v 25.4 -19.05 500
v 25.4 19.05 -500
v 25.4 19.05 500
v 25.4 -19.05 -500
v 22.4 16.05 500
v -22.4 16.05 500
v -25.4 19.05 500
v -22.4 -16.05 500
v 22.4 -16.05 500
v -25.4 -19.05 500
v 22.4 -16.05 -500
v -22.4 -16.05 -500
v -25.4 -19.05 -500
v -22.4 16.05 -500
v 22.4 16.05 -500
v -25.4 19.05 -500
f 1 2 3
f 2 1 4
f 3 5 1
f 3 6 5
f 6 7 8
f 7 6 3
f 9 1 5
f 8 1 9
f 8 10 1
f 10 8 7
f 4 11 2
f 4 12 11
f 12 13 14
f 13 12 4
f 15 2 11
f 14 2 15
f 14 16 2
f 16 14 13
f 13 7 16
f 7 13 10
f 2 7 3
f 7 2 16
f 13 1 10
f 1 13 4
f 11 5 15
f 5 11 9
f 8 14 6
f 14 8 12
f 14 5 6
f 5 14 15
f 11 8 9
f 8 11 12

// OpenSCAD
// Aluminium rectangular box section: 50.8mm x 38.1mm x 3.0mm
// Robust hollow extrusion (one connected solid)

// Parameters
L = 1000;   //[50:2000:10]   Length (Z)
W = 50.8;   //[25.4:101.6:0.1] Outside width (X)
H = 38.1;   //[19.05:76.2:0.1] Outside height (Y)
t = 3.0;    //[1.0:10:0.1]   Wall thickness
eps = 0.05; //[0.01:0.2:0.01] Boolean tolerance

$fn = 64;

// Derived inner dimensions (must remain positive)
innerW = max(W - 2*t, eps);
innerH = max(H - 2*t, eps);

module box_section(len=L, w=W, h=H, th=t) {
    difference() {
        // Outer solid
        cube([w, h, len], center=true);

        // Inner void: slightly longer in Z to guarantee clean subtraction
        cube([innerW, innerH, len + 2*eps], center=true);
    }
}

// Final output (centered at origin)
color([0.75, 0.75, 0.78]) box_section();
